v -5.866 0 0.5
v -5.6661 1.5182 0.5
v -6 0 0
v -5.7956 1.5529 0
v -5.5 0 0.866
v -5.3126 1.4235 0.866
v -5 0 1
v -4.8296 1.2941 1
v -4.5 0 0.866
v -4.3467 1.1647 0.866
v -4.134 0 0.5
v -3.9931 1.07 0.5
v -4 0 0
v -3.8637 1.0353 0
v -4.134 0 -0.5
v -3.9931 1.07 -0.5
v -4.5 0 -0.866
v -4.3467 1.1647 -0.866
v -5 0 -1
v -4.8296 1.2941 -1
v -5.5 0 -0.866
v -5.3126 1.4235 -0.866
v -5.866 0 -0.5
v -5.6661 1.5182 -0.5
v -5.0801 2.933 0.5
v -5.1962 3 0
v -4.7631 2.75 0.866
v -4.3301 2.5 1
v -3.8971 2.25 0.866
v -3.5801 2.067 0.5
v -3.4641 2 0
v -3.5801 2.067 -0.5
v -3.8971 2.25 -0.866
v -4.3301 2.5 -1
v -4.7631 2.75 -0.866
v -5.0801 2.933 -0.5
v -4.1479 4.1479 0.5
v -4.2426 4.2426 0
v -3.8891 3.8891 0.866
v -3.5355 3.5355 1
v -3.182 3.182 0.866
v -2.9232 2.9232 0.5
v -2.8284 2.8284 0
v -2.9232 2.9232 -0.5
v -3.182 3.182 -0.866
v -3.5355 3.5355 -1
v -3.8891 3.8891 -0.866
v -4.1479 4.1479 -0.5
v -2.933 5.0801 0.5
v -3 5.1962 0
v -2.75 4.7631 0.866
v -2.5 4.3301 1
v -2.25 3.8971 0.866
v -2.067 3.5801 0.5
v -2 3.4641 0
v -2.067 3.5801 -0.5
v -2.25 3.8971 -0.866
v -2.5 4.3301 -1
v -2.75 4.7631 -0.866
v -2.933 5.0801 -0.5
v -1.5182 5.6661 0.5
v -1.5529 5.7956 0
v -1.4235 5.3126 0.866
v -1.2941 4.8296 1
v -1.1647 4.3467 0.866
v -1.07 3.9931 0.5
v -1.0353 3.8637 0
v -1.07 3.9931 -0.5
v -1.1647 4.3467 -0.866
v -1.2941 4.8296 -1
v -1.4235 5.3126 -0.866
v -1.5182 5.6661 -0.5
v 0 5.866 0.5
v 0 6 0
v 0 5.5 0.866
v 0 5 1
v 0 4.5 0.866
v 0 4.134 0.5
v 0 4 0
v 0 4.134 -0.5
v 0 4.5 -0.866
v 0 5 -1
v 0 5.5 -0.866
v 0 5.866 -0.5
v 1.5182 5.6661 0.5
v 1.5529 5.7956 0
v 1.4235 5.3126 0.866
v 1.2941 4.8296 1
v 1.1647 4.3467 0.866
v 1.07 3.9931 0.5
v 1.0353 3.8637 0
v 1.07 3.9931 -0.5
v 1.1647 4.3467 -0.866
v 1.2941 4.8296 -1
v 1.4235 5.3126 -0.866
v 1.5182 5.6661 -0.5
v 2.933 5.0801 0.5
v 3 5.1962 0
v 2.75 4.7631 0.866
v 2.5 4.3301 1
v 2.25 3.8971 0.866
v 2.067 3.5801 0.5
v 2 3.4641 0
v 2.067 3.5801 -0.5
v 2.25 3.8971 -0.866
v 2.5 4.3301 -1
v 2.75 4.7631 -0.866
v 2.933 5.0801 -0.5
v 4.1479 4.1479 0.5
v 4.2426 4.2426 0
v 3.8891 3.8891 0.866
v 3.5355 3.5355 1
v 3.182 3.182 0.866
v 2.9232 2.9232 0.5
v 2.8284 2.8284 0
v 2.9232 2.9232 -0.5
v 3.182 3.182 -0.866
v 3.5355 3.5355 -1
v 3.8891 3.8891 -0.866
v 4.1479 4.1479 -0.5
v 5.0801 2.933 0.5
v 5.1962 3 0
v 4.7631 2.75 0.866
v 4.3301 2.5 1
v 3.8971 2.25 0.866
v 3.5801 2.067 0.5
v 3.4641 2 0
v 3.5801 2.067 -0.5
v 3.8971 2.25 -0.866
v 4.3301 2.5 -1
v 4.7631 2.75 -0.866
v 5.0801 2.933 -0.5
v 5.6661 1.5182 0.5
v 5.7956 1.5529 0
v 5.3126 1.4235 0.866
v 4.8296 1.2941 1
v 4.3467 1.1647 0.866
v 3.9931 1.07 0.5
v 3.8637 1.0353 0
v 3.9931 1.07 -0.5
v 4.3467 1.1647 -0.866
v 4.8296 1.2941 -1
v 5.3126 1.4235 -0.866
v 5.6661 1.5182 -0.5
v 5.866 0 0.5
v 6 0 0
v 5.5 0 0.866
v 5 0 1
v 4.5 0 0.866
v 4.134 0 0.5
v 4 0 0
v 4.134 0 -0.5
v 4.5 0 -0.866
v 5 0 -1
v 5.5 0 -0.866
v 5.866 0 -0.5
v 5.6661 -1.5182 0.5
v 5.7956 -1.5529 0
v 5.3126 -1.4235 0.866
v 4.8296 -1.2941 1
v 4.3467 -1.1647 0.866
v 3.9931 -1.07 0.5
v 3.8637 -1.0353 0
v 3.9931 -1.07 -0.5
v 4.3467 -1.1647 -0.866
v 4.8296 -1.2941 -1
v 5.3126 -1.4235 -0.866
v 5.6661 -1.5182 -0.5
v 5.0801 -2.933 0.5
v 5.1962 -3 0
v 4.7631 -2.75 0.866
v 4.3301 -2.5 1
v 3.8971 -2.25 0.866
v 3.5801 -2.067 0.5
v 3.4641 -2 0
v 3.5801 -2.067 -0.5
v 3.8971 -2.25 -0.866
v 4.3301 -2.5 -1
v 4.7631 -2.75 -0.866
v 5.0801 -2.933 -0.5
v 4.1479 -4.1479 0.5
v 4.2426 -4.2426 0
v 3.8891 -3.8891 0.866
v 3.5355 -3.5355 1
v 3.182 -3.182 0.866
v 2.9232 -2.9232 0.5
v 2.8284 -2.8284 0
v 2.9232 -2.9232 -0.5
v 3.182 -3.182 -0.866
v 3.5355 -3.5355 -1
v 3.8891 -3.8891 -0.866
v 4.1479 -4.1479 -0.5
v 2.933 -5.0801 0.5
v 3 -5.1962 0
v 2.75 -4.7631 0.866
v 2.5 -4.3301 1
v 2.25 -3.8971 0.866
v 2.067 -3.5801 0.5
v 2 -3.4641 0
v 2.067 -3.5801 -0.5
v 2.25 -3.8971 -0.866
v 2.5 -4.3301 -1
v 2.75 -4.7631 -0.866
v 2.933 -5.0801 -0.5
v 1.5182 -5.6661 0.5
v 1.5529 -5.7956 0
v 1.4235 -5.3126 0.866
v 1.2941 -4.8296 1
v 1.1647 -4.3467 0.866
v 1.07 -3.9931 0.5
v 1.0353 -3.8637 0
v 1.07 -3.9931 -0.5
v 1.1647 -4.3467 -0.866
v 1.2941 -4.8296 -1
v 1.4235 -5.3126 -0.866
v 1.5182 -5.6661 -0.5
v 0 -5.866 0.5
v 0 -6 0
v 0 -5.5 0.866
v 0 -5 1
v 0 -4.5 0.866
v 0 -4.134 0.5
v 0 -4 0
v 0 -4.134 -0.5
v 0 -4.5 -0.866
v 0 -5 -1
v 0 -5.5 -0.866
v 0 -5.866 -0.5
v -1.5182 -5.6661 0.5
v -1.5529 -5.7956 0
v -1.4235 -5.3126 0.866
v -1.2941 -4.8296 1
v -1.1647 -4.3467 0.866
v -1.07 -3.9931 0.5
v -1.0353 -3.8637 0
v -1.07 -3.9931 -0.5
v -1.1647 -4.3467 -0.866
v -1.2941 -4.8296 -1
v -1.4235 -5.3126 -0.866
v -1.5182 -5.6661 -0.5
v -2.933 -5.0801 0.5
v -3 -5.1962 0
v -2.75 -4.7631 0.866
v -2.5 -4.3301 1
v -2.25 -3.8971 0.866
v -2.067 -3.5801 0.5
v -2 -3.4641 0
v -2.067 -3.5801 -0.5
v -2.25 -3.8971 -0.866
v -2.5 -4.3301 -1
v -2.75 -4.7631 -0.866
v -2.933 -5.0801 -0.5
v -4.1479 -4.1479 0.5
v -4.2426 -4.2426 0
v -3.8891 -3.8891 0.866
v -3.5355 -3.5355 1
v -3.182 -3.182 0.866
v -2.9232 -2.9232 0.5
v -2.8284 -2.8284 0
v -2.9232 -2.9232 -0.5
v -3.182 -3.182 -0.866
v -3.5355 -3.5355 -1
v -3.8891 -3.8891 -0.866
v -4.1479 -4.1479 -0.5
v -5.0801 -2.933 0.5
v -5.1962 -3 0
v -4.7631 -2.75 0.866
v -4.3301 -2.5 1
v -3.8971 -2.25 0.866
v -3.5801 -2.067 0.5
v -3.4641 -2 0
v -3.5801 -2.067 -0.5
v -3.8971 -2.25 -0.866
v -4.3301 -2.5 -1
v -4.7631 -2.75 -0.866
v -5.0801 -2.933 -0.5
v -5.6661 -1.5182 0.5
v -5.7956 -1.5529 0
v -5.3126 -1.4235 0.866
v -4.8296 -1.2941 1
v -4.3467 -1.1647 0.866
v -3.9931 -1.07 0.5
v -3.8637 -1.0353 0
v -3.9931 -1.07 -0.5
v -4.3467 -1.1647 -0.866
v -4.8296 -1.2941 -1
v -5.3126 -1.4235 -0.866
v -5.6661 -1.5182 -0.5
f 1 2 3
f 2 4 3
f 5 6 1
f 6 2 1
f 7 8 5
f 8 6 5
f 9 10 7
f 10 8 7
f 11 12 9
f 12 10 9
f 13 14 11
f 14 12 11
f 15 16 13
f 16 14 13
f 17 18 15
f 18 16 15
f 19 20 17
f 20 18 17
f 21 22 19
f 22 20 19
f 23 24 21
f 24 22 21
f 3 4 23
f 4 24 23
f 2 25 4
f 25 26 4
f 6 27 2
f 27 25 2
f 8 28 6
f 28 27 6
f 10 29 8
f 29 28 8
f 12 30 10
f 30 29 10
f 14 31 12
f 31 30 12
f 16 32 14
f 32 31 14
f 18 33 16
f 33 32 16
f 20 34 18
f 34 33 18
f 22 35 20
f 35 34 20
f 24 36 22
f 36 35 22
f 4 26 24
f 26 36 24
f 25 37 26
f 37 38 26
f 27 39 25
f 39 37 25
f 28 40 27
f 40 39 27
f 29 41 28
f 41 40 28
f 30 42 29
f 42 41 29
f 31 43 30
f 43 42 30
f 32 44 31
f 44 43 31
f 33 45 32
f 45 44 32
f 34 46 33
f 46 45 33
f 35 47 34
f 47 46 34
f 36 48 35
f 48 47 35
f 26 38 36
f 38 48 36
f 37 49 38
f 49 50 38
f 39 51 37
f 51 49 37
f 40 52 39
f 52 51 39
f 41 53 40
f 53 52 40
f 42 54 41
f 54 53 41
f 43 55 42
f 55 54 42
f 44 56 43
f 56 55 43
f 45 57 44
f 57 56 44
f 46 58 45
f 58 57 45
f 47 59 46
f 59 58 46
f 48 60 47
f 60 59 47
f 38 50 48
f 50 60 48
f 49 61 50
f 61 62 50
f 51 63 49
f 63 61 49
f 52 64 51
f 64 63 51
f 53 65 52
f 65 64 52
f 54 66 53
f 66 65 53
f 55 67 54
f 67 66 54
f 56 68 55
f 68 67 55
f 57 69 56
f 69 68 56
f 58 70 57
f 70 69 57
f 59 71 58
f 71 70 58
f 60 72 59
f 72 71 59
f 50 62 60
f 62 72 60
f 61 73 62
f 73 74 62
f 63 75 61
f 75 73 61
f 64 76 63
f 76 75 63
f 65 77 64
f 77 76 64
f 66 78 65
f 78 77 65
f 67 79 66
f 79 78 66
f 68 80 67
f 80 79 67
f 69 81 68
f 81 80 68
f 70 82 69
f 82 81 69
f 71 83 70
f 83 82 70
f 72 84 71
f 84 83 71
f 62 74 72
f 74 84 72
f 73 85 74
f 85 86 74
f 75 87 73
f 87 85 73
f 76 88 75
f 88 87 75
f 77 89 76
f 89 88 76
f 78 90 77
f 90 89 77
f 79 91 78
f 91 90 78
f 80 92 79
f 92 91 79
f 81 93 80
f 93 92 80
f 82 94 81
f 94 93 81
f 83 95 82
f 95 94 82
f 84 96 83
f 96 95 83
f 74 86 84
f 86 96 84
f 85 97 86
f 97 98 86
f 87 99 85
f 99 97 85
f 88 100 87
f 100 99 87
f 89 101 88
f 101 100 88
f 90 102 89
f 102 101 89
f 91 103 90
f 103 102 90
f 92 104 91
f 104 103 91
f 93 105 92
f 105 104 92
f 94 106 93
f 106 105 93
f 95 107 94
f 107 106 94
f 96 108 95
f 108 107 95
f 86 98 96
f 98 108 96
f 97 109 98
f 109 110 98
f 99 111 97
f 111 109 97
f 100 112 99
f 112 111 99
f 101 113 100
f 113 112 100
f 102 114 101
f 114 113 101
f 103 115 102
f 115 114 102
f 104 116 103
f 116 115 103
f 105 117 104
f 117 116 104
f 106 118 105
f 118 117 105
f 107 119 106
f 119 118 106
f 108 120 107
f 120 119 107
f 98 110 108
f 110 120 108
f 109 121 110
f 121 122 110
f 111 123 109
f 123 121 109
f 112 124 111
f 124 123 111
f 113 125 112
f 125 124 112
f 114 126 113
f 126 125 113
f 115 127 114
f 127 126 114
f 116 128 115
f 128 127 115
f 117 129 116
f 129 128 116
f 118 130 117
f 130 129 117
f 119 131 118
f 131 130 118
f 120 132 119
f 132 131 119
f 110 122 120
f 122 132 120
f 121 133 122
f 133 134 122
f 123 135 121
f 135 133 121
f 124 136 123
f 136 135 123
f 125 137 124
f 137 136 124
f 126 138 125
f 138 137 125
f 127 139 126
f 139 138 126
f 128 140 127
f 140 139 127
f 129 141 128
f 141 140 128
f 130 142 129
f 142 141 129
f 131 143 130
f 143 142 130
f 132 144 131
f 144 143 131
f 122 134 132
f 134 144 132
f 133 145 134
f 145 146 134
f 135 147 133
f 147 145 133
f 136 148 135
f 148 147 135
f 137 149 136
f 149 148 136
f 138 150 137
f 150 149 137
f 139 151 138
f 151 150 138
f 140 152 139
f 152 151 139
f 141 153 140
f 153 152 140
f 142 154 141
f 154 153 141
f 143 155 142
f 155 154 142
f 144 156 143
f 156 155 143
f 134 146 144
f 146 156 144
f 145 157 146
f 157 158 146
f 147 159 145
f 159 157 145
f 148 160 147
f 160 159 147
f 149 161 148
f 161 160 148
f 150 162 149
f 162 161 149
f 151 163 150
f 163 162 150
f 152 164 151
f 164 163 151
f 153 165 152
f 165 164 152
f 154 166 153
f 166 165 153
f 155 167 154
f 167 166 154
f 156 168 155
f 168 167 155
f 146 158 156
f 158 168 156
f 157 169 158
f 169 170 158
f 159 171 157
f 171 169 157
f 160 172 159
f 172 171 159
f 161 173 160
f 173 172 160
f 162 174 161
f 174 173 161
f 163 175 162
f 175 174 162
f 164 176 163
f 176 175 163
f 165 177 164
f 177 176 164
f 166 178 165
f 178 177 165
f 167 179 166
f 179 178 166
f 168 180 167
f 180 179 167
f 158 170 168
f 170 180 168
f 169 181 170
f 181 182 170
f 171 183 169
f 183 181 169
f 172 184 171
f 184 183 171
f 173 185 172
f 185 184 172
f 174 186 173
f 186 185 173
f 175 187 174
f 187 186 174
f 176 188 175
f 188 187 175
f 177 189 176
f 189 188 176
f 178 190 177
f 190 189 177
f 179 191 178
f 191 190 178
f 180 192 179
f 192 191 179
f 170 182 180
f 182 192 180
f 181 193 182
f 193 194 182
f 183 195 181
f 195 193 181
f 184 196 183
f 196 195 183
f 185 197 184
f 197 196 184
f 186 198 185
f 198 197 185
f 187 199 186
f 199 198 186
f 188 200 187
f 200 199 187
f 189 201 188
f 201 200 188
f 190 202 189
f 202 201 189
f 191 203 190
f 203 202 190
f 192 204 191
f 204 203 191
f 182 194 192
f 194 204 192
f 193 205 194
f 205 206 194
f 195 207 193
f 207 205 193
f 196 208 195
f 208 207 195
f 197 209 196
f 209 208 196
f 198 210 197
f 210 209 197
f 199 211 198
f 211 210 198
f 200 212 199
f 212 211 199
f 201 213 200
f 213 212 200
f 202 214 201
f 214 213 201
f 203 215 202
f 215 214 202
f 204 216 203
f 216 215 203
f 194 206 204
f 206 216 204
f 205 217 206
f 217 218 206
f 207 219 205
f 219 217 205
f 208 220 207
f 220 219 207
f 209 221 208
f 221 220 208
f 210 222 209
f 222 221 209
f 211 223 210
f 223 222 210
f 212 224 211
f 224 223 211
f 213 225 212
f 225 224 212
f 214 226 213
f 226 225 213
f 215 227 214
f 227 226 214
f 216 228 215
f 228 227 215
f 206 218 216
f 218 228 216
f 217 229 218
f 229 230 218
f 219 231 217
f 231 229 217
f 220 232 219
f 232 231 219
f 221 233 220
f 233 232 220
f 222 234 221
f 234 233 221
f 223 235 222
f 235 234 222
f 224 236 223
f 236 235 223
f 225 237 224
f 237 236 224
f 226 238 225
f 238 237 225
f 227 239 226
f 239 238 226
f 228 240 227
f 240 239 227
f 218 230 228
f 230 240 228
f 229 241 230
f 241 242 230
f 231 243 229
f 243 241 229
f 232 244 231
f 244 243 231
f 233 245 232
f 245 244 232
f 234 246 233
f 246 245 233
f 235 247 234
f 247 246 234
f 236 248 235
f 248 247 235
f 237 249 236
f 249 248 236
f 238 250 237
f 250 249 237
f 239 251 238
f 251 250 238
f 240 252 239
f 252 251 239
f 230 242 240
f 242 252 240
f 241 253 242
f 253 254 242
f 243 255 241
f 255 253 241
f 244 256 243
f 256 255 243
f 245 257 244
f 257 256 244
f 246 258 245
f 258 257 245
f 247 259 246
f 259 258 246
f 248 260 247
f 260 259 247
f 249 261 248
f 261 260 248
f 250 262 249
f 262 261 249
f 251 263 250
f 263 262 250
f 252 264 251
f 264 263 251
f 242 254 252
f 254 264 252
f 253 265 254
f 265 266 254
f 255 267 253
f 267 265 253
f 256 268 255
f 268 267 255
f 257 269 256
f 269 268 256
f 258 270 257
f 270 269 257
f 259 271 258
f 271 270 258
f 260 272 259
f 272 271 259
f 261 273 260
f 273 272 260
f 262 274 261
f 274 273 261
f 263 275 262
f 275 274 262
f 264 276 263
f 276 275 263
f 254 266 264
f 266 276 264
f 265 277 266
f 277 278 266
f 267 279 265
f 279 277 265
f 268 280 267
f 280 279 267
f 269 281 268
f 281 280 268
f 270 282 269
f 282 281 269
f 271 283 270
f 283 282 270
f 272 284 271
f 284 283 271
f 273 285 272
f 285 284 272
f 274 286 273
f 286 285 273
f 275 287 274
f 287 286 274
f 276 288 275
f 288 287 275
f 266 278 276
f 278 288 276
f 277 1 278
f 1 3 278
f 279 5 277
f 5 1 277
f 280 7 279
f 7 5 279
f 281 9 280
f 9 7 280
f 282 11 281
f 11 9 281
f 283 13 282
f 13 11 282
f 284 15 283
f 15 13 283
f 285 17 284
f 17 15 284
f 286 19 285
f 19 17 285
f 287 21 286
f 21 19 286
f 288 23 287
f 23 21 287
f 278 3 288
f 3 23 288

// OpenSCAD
// full rotate_extrude
rotate_extrude($fn = 24) translate([5, 0]) circle(1, $fn = 12);
